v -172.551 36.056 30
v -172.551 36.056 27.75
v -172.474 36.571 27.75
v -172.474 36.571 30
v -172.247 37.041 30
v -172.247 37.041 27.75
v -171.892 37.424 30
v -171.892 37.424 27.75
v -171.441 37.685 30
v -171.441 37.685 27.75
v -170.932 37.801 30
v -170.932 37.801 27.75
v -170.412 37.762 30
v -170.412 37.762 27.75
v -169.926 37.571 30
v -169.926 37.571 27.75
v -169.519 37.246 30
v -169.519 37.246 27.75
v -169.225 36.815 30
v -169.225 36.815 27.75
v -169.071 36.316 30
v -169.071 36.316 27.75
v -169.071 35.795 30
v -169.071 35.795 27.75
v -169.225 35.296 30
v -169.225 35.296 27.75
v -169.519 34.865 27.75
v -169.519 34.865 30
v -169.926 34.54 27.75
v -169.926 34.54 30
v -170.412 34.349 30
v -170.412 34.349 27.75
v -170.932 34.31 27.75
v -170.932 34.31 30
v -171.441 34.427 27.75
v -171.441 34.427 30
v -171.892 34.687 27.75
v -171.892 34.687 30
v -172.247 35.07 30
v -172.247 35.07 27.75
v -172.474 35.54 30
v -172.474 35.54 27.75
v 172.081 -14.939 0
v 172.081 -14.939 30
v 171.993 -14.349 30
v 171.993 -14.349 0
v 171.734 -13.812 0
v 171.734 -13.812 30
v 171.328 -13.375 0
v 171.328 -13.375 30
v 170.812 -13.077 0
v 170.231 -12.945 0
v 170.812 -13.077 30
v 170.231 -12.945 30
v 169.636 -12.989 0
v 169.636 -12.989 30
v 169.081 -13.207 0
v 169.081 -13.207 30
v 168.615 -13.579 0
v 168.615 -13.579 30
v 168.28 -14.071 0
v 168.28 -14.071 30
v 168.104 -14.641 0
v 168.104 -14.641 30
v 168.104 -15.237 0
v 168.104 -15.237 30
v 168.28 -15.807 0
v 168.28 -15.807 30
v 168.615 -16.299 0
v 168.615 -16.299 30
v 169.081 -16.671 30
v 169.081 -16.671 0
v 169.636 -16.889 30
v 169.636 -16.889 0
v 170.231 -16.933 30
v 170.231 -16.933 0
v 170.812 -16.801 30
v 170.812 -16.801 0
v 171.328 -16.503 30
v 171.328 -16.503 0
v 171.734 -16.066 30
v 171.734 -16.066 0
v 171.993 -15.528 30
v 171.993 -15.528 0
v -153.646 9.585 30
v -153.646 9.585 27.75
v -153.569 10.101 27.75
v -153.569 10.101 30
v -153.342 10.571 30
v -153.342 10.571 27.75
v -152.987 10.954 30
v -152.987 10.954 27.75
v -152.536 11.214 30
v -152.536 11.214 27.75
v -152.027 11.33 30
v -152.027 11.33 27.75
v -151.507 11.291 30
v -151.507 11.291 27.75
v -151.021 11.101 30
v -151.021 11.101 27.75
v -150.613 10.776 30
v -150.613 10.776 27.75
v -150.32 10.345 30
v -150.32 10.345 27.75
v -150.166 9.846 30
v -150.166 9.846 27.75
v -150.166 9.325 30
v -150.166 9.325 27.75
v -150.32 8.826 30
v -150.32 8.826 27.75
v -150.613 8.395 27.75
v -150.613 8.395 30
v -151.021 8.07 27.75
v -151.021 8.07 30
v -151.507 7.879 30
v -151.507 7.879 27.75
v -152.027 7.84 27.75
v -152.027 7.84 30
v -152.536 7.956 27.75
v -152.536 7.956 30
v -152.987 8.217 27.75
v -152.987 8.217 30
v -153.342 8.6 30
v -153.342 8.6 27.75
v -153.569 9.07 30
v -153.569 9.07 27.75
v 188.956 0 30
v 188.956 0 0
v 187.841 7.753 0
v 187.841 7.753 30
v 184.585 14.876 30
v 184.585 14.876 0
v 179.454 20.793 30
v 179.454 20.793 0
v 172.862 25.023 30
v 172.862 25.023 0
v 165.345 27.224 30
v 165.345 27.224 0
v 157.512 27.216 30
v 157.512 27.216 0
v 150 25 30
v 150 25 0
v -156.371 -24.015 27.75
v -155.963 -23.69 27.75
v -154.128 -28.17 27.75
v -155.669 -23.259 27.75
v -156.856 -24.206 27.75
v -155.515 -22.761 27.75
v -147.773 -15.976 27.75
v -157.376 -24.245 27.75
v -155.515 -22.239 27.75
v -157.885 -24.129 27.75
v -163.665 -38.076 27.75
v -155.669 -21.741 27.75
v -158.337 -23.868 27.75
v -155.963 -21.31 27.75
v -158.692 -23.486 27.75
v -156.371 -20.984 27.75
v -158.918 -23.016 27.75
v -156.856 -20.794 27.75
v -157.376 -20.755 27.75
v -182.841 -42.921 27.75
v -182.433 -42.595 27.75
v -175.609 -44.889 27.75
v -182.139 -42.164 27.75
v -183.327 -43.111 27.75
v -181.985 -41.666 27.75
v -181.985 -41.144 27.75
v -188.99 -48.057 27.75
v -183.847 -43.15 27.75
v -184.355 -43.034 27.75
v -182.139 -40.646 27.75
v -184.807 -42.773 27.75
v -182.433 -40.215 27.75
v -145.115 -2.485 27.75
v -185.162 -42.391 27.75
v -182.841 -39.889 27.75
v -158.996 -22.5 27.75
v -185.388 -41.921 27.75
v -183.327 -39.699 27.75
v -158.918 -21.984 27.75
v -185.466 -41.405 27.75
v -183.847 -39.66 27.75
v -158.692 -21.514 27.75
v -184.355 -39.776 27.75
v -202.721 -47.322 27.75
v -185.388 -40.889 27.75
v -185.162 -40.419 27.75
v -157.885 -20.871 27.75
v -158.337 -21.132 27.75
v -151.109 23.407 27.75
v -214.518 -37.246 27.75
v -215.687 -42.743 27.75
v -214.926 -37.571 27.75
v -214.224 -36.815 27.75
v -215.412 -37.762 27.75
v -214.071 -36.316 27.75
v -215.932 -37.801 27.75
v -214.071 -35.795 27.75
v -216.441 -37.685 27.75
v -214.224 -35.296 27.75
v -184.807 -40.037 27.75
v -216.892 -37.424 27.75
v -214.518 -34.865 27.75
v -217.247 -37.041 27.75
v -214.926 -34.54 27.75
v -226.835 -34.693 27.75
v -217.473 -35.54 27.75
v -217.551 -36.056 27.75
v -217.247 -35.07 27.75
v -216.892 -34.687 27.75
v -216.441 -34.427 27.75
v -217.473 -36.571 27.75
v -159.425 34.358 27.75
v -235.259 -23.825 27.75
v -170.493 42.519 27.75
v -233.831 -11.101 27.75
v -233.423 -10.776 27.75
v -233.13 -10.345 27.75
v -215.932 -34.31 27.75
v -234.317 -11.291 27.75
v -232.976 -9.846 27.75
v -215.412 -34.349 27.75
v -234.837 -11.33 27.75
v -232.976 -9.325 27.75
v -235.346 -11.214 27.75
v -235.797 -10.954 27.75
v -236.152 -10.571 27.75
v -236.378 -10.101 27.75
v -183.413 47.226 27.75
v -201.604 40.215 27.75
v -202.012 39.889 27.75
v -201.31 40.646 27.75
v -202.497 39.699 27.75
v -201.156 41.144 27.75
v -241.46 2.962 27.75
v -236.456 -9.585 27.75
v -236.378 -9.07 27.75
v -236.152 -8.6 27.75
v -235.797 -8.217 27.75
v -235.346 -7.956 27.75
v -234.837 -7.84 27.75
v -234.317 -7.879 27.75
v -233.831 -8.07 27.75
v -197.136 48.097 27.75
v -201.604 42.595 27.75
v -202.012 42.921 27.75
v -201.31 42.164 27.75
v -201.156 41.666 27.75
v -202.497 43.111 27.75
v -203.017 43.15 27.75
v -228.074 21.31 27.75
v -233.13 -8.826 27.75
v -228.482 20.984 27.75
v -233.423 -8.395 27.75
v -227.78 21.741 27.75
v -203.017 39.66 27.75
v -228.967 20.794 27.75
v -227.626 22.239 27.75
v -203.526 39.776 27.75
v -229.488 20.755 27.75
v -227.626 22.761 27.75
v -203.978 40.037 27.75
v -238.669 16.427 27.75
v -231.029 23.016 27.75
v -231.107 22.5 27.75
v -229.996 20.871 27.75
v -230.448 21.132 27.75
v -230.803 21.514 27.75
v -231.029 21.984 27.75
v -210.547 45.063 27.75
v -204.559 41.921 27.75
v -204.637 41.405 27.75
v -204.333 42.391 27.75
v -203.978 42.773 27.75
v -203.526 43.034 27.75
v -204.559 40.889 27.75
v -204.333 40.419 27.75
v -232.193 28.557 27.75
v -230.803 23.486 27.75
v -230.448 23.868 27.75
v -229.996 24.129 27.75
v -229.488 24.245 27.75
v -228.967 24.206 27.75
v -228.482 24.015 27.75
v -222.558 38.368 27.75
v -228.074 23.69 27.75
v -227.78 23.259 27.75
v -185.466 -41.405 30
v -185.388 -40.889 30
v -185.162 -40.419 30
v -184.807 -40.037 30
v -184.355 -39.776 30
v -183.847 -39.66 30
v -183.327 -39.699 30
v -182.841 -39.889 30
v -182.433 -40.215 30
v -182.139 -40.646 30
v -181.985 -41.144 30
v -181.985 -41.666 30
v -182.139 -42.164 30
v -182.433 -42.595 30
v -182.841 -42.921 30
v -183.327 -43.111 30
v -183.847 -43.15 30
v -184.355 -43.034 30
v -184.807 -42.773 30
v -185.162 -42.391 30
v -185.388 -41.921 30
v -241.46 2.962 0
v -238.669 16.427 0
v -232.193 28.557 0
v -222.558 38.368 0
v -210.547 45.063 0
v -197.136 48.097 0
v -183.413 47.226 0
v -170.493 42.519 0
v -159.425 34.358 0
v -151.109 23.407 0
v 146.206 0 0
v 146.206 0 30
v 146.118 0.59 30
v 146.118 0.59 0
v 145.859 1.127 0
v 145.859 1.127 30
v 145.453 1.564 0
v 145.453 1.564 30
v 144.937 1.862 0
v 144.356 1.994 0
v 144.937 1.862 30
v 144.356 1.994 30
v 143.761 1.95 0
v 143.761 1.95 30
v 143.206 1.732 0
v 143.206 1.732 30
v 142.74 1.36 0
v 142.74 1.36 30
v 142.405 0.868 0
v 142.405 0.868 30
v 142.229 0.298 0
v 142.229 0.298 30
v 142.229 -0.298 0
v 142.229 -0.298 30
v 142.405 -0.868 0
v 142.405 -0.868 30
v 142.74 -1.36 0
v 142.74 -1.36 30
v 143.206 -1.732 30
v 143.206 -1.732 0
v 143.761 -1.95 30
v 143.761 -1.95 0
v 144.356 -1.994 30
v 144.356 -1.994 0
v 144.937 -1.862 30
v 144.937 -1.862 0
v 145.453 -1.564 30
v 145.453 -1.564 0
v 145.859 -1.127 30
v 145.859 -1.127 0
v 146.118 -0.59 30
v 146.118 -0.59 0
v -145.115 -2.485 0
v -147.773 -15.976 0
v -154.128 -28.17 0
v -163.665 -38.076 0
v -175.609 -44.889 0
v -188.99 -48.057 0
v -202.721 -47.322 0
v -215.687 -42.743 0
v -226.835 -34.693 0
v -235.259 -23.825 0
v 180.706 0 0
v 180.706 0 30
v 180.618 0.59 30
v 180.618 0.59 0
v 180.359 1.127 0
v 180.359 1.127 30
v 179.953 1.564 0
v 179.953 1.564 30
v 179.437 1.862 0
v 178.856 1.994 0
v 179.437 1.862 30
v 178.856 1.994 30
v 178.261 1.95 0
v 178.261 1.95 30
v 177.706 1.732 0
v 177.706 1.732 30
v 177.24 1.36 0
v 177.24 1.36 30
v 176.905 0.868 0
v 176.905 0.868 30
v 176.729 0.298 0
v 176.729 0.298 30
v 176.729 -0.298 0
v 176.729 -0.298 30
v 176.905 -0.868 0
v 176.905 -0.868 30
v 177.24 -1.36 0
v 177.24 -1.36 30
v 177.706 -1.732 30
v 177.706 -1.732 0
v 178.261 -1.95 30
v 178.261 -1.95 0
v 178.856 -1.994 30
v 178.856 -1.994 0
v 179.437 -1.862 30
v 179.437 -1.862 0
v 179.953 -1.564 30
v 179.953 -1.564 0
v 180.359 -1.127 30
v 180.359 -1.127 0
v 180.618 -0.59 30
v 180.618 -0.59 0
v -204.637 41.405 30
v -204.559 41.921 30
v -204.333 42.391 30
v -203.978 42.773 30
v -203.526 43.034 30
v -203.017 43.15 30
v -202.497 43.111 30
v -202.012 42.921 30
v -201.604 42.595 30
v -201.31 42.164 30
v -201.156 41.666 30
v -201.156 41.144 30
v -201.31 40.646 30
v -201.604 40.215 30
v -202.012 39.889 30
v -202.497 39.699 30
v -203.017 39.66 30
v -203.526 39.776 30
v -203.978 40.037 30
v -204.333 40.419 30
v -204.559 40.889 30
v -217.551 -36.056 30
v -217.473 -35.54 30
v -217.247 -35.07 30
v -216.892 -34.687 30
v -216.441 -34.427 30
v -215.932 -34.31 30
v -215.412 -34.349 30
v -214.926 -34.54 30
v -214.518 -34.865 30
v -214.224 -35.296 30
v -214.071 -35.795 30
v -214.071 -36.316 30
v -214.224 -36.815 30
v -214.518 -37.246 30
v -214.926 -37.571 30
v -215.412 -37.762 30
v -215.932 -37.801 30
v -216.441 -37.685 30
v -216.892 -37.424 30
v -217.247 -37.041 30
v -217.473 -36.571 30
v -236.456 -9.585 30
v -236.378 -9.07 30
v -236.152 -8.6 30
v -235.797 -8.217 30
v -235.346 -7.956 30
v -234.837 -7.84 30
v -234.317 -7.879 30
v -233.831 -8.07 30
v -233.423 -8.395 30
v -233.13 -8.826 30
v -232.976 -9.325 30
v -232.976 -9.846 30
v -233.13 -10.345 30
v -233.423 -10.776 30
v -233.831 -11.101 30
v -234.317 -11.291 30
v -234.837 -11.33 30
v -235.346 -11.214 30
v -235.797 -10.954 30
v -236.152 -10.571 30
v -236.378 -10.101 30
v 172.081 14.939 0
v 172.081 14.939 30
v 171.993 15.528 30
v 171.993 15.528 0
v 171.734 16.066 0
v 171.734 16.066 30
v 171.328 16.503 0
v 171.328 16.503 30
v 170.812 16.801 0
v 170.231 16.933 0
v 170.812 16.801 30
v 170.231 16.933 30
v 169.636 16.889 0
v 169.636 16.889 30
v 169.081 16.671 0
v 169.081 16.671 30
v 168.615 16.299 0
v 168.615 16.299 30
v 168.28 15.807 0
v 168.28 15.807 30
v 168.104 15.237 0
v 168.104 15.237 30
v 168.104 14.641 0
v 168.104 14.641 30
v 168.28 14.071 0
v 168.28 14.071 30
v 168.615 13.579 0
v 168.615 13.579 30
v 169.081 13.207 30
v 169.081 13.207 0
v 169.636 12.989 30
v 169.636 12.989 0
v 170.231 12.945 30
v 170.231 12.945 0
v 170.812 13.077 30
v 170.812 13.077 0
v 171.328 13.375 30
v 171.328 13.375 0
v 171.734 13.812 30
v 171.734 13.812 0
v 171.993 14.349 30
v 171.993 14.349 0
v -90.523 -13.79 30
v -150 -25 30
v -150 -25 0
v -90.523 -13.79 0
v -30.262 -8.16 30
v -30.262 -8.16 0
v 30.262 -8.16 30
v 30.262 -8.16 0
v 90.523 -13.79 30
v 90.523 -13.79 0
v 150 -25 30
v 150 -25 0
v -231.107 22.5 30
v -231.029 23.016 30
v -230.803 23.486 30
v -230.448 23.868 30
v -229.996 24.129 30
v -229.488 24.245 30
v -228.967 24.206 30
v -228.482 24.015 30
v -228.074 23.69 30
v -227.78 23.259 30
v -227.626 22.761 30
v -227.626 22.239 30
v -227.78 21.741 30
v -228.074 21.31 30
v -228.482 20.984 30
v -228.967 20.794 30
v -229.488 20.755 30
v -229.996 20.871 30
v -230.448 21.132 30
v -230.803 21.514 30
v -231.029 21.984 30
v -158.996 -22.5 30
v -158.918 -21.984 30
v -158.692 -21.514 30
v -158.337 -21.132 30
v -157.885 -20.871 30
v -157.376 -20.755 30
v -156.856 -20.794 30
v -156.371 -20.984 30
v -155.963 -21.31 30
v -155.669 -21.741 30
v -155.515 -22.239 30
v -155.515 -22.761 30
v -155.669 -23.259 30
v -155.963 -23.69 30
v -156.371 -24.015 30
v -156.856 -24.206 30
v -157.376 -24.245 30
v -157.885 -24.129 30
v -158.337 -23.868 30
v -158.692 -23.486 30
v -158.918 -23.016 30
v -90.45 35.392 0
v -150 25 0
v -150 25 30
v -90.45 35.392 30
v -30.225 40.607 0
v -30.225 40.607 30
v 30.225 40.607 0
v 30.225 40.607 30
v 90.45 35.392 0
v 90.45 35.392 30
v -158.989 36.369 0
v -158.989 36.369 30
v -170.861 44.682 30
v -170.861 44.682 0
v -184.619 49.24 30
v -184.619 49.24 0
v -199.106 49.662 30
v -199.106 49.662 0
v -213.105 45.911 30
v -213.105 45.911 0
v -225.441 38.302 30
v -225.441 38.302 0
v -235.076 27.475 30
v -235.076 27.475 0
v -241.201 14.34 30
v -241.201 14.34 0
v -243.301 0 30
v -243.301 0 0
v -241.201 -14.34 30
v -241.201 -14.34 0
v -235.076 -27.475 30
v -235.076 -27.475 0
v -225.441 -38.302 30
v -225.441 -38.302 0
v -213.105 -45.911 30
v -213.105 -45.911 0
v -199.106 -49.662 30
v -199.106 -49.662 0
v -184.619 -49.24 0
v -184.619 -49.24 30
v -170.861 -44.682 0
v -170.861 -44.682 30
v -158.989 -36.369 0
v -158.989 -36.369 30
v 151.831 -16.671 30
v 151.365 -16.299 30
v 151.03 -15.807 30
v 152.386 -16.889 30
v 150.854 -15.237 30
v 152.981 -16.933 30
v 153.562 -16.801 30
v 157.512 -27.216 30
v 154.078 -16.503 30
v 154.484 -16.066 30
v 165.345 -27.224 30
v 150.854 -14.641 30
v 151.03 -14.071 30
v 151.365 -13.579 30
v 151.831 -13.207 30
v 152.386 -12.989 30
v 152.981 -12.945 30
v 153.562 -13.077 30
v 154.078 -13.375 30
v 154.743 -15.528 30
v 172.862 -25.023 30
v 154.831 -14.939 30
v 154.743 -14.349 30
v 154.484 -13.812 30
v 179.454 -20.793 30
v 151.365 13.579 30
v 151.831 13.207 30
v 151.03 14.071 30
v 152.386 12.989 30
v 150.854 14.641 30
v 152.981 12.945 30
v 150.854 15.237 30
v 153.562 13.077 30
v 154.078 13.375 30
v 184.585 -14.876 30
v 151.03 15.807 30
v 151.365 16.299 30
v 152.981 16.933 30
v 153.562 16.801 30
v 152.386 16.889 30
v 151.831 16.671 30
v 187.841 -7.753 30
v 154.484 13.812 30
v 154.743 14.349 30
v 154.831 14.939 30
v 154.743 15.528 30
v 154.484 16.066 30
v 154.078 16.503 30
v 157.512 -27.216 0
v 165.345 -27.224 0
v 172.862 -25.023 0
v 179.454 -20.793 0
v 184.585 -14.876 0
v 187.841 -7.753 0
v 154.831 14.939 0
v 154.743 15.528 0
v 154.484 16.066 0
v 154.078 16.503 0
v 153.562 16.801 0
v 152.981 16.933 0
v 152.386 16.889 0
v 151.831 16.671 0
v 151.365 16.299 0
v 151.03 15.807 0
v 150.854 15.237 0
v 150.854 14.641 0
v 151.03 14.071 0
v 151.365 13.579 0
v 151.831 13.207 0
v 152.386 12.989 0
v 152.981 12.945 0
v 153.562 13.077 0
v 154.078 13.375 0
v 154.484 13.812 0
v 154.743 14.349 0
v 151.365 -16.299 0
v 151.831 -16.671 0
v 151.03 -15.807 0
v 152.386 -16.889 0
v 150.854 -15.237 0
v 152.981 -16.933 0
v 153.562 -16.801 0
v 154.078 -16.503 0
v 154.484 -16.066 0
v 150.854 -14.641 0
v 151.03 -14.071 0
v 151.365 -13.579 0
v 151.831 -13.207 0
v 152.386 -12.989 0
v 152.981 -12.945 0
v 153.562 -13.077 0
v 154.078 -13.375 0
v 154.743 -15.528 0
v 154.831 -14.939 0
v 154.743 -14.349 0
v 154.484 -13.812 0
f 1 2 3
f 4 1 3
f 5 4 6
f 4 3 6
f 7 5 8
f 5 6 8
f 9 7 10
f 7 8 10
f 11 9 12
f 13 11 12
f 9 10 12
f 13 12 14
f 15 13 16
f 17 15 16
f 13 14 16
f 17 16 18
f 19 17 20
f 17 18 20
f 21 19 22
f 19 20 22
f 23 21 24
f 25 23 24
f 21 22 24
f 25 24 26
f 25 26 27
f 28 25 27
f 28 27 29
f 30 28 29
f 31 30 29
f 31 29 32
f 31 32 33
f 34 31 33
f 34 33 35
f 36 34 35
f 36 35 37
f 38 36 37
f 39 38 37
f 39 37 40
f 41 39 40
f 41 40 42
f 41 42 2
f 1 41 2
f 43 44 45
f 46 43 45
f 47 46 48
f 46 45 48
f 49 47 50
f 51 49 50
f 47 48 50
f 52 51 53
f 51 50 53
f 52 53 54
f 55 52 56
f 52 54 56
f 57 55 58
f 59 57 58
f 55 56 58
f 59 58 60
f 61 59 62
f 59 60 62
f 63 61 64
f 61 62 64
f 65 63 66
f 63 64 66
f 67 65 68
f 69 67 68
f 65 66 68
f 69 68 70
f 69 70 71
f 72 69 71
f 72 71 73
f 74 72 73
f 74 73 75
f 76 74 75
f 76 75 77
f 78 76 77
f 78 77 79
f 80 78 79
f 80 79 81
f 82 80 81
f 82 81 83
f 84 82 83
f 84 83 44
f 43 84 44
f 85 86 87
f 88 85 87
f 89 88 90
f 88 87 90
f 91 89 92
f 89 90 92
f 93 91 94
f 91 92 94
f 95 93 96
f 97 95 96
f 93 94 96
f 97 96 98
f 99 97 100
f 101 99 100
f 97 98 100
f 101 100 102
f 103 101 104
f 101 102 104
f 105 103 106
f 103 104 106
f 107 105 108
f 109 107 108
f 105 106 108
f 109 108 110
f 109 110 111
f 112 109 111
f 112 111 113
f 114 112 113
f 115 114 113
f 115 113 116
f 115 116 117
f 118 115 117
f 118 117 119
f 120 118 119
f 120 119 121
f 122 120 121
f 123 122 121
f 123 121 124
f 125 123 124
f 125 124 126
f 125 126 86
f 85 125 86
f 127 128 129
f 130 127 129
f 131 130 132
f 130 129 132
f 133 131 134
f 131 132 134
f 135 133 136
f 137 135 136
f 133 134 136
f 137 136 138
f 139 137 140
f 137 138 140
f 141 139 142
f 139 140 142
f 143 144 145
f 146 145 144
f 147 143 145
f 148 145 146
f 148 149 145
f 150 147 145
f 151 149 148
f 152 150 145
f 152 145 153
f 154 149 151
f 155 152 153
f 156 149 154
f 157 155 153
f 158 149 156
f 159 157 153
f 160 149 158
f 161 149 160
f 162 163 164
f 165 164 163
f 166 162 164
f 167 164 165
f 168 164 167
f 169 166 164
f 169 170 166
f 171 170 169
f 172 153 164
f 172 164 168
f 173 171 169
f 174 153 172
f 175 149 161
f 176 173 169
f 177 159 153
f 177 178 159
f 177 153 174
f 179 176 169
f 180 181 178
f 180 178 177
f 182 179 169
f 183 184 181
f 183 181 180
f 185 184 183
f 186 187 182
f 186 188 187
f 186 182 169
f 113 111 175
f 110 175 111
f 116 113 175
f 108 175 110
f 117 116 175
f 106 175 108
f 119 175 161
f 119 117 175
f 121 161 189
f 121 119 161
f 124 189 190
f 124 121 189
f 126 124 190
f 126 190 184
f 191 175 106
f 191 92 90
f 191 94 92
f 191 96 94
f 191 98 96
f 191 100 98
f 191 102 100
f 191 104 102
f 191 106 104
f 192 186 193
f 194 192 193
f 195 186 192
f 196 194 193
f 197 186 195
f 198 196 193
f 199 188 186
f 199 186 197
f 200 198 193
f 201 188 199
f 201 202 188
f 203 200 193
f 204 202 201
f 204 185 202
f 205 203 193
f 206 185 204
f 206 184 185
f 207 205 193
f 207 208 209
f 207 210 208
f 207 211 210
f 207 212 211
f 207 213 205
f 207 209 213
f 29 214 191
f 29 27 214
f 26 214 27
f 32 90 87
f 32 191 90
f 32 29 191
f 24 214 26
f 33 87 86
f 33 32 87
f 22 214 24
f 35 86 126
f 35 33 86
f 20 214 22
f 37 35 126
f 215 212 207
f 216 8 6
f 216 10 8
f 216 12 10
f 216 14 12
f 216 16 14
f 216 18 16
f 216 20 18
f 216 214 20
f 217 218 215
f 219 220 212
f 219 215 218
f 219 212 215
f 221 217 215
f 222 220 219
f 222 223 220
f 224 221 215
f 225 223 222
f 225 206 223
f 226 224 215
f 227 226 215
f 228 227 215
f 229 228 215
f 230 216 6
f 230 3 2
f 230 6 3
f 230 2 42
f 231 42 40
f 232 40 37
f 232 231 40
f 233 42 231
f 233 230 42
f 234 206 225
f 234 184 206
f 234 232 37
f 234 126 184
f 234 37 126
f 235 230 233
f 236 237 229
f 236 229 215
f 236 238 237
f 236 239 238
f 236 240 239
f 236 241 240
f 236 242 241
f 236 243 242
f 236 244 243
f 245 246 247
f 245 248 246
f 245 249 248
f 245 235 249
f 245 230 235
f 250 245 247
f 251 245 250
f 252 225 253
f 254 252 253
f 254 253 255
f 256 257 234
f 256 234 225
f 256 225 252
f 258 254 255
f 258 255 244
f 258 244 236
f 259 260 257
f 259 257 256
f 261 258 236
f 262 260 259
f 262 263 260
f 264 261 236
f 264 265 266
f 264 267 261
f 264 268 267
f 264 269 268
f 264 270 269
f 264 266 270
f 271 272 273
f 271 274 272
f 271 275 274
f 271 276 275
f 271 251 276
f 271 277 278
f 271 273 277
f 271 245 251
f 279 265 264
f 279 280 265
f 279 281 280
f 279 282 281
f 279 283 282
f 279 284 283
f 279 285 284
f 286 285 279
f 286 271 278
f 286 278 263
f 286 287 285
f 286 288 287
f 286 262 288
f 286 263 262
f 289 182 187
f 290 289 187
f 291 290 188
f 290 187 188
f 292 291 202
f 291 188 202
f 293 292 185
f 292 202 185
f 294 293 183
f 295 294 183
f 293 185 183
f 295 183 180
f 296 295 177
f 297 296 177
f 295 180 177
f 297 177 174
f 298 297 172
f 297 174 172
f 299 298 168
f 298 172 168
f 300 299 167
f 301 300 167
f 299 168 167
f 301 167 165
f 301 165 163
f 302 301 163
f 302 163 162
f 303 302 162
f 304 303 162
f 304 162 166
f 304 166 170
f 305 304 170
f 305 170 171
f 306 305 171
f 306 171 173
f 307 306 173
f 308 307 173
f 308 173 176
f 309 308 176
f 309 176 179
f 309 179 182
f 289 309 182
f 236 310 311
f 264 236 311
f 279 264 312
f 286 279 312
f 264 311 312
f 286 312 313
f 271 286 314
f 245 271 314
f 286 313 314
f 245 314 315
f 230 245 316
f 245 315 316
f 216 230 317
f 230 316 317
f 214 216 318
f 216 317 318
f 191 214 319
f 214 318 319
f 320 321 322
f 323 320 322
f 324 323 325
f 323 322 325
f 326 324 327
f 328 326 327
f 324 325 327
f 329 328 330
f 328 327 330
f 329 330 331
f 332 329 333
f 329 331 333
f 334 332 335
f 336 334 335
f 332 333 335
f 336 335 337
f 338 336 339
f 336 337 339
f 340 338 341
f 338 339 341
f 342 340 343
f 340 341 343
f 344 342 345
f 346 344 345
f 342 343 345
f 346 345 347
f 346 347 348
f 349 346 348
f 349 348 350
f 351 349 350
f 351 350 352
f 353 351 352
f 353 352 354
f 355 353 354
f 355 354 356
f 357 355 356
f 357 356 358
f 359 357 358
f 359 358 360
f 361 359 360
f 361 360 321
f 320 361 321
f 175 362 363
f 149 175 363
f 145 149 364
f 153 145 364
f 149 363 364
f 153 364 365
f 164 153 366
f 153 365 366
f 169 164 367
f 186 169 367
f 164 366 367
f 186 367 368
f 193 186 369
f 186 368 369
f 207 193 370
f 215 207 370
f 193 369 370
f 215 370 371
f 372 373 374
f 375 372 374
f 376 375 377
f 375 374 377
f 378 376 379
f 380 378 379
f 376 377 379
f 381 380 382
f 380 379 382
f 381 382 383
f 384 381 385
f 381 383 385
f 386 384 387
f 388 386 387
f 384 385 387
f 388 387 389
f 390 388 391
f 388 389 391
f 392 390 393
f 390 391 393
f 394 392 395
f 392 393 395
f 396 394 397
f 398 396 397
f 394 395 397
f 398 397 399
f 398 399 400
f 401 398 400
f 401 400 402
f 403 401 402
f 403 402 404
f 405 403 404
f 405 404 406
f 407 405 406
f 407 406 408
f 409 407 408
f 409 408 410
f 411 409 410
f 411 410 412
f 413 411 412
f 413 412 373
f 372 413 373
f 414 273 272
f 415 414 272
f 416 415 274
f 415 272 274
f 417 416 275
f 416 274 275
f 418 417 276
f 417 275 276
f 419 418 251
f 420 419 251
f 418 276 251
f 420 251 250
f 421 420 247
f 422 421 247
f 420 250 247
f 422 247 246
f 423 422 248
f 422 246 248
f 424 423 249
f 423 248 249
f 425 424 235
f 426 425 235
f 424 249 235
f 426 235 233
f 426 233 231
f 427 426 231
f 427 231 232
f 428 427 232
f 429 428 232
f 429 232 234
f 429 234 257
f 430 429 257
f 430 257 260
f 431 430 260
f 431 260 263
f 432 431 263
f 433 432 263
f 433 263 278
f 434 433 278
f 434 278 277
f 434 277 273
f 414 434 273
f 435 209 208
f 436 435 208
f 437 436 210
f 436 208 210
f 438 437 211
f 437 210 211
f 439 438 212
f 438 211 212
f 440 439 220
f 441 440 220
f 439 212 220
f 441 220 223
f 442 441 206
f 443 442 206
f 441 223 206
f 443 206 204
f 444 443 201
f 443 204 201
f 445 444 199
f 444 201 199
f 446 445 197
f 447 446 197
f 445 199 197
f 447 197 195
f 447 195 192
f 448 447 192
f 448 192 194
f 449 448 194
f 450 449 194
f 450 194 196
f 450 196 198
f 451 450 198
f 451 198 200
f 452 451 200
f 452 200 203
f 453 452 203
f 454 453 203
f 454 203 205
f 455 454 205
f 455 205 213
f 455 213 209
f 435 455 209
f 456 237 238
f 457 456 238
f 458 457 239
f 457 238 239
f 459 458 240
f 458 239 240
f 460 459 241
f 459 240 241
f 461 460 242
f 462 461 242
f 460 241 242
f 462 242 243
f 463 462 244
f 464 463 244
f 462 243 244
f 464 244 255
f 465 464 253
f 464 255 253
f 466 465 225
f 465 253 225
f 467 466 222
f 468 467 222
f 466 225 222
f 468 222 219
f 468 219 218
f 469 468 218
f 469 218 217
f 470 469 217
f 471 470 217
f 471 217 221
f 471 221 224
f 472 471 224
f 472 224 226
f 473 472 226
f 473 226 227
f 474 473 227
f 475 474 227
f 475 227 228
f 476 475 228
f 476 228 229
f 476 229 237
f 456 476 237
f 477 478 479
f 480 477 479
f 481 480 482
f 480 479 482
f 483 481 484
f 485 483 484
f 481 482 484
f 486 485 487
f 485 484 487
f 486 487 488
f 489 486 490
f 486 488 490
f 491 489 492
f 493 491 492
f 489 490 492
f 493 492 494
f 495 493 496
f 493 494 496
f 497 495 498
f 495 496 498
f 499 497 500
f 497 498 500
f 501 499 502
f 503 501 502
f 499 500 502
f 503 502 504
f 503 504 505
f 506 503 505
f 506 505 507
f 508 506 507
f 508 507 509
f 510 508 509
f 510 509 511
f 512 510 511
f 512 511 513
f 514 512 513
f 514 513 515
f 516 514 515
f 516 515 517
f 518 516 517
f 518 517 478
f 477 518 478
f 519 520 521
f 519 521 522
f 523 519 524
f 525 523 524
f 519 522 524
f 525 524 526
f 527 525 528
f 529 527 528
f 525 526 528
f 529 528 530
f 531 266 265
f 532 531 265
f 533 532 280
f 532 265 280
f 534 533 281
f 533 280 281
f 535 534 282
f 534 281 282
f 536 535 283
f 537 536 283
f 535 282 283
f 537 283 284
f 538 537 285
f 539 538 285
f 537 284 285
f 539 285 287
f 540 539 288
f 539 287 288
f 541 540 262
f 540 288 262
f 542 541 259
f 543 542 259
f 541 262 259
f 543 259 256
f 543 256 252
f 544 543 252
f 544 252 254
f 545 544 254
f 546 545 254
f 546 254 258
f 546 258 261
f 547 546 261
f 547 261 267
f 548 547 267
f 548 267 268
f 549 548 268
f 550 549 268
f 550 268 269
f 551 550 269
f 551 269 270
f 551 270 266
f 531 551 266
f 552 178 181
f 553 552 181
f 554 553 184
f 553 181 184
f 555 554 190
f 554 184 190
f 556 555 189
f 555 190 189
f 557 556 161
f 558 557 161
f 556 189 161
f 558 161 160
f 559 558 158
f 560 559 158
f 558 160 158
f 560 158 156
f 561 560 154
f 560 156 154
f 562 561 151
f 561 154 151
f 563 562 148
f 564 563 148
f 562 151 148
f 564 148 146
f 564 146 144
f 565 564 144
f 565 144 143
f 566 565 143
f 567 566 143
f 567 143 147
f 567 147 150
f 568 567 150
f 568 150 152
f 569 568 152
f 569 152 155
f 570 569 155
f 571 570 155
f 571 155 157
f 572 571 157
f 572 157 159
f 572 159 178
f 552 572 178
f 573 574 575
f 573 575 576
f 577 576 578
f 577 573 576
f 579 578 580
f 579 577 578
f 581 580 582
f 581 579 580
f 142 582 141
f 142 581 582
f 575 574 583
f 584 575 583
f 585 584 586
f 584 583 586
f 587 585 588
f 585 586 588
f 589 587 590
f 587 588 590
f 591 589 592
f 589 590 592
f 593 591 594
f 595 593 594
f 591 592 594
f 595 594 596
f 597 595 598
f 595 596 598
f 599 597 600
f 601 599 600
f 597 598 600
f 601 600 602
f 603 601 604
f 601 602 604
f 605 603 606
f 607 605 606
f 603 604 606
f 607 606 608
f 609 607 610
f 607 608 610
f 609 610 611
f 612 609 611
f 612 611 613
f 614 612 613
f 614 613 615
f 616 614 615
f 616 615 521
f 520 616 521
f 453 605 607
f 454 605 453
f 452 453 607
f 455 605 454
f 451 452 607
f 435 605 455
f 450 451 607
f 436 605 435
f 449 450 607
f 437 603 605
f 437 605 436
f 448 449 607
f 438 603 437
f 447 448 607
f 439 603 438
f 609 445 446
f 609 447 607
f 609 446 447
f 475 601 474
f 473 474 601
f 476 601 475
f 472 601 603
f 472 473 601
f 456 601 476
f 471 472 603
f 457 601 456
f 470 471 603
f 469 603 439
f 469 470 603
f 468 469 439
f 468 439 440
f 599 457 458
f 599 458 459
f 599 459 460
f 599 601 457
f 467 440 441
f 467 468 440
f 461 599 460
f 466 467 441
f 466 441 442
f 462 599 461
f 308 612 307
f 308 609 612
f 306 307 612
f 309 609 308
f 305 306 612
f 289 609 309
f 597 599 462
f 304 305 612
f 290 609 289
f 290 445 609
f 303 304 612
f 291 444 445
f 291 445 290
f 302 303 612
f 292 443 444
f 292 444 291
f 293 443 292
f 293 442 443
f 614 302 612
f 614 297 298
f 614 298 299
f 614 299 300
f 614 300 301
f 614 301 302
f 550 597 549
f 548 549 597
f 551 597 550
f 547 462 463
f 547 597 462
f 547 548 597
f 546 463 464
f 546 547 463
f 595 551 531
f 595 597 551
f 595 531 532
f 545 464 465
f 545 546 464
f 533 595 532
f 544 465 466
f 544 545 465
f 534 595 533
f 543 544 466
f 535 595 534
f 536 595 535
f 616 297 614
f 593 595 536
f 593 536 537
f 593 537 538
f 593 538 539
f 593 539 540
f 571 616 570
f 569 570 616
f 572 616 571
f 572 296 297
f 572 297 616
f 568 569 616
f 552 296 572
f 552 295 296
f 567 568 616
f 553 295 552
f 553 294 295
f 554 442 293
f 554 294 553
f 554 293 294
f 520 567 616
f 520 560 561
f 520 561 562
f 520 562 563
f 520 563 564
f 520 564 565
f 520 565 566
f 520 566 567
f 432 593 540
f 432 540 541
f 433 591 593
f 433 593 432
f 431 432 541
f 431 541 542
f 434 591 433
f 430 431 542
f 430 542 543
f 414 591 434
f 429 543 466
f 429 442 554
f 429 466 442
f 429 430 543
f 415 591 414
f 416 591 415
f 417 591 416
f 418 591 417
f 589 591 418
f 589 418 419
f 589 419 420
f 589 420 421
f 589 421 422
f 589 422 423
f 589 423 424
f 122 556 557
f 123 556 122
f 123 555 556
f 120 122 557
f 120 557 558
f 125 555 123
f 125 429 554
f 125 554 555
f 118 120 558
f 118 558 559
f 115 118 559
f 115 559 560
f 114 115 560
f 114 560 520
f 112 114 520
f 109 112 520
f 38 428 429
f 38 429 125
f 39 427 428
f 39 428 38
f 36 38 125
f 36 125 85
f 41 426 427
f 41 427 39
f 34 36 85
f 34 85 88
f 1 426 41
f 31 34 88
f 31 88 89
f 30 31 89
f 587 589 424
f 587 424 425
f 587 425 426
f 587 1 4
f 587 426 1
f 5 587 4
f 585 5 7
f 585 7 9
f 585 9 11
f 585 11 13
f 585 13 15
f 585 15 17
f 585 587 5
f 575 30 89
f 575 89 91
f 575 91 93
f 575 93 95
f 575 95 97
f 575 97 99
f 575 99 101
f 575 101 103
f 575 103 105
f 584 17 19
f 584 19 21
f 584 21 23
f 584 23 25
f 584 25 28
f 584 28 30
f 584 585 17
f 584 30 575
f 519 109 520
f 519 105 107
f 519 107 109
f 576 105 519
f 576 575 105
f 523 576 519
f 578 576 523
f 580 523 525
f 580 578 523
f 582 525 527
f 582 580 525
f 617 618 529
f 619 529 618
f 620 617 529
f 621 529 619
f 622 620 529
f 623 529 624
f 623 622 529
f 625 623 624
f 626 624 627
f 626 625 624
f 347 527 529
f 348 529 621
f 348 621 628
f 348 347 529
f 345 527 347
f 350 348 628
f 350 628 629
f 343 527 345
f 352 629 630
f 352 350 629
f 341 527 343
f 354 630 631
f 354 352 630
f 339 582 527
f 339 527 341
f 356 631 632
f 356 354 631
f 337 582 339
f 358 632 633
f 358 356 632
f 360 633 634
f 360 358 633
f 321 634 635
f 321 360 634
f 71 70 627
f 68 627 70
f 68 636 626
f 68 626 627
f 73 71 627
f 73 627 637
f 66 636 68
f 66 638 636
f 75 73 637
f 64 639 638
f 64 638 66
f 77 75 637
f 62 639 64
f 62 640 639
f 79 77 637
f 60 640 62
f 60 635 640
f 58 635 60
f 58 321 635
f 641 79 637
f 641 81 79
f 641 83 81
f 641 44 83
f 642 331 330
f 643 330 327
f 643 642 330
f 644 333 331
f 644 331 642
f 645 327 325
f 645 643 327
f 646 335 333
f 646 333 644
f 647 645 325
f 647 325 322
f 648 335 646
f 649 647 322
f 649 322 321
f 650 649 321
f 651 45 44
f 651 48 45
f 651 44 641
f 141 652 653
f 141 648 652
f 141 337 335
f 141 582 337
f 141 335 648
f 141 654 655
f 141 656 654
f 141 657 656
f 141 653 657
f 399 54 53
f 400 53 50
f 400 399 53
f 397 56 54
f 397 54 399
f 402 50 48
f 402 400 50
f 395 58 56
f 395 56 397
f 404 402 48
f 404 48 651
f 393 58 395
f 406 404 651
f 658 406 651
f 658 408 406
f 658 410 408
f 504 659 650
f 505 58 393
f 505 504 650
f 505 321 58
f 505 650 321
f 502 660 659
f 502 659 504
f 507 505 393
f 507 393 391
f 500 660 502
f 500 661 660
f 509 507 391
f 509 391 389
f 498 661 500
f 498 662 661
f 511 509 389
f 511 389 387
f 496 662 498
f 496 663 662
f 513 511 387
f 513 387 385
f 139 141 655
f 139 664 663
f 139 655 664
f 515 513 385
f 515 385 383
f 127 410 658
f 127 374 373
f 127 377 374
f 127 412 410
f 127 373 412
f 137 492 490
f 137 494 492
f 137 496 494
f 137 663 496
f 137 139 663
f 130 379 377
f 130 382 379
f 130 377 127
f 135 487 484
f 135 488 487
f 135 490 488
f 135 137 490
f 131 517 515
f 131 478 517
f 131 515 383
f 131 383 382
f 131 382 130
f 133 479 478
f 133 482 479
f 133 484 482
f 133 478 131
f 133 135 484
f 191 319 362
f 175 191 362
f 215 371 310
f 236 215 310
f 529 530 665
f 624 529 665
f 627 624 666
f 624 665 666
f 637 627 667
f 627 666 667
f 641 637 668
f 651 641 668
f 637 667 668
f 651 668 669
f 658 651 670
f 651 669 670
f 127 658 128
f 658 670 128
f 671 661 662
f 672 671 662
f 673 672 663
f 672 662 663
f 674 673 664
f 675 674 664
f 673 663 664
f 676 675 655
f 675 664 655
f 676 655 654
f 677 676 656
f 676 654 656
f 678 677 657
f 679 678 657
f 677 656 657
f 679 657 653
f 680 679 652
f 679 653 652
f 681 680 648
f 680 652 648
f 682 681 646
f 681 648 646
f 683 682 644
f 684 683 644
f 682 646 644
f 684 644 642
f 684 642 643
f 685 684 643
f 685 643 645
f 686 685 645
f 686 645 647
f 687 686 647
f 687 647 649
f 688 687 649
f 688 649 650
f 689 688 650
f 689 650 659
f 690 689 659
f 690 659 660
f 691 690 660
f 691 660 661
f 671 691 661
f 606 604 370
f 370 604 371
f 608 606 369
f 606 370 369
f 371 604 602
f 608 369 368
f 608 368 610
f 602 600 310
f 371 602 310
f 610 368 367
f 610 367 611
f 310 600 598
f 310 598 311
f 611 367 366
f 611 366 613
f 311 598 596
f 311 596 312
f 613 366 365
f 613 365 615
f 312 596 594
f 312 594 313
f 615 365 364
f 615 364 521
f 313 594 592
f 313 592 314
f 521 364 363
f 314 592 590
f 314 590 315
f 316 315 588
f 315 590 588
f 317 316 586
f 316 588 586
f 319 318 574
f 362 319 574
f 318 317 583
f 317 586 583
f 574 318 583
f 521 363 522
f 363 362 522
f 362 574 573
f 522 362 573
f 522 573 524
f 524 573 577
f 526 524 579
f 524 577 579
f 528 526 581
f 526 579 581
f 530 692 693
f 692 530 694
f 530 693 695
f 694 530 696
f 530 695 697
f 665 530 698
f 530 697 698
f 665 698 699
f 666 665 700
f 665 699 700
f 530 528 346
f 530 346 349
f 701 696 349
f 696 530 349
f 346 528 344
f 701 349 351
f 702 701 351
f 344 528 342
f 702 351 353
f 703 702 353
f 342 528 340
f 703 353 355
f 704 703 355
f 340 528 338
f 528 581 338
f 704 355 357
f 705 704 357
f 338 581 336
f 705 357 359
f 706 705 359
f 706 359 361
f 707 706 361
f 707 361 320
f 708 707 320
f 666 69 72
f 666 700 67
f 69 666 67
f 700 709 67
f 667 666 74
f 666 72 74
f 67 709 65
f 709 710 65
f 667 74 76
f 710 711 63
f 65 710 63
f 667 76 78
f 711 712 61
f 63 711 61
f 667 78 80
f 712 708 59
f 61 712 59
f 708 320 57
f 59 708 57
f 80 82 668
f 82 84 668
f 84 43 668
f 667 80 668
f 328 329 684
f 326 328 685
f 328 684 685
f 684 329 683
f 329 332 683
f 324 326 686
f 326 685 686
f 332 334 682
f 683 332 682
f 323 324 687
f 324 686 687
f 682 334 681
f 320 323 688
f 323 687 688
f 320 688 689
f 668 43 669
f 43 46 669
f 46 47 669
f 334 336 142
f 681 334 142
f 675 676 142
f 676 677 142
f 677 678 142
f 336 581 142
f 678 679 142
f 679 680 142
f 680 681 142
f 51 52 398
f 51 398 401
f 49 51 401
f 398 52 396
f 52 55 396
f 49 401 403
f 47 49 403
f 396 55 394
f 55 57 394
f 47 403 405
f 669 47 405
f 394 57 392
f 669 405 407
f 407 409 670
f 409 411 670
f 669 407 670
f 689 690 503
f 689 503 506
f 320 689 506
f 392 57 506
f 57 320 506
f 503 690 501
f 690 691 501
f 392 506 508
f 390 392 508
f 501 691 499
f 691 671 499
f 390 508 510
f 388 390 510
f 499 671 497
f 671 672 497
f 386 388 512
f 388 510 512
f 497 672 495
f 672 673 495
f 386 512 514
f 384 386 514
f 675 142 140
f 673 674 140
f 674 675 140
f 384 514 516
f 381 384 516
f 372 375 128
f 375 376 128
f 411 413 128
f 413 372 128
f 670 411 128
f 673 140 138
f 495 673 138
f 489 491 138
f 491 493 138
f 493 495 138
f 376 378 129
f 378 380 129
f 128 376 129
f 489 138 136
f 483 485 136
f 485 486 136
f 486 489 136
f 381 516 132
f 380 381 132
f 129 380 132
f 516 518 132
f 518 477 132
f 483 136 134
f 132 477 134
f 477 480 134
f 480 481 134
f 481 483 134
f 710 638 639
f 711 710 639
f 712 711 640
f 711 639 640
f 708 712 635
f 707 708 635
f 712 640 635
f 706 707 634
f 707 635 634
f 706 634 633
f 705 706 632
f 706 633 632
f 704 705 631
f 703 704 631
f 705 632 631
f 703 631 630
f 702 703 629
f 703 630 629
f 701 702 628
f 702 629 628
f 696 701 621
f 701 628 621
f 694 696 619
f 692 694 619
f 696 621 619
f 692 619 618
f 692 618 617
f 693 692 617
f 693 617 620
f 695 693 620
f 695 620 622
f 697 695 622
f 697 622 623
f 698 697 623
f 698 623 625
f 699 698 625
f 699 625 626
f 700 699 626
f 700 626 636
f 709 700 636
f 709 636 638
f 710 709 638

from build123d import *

# Parameters (mm, degrees)
EXTRUDE_3_DEPTH     = 30
CUT_EXTRUDE_1_DEPTH = 27.75
SKETCH_5_R          = 1.75
CUT_EXTRUDE_2_DEPTH = 250.931131666
SKETCH_6_R          = 2
CUT_EXTRUDE_3_DEPTH = 251.190943233


with BuildPart() as part:
    # 草图1 → 凸台-拉伸3 (new body)
    with BuildSketch(Plane.XY):
        with BuildLine():
            ThreePointArc((188.956439237, 0), (176.309013441, 23.14413618), (150, 25))
            Line((150, 25), (150, -25))
            ThreePointArc((150, -25), (176.309013441, -23.14413618), (188.956439237, 0))
        make_face()
        with BuildLine():
            Line((150, -25), (150, 25))
            ThreePointArc((150, 25), (133.956439237, 0), (150, -25))
        make_face()
        with BuildLine():
            ThreePointArc((188.956439237, 0), (176.309013441, 23.14413618), (150, 25))
            Line((150, 25), (150, -25))
            ThreePointArc((150, -25), (176.309013441, -23.14413618), (188.956439237, 0))
        make_face()
        with BuildLine():
            Line((150, -25), (150, 25))
            ThreePointArc((150, 25), (133.956439237, 0), (150, -25))
        make_face()
        with BuildLine():
            Line((150, 25), (-150, 25))
            ThreePointArc((-150, 25), (-145.004978875, 12.940952255), (-143.301270189, 0))
            ThreePointArc((-143.301270189, 0), (-145.004978875, -12.940952255), (-150, -25))
            ThreePointArc((-150, -25), (0, -7.455532034), (150, -25))
            ThreePointArc((150, -25), (133.956439237, 0), (150, 25))
        make_face()
        with BuildLine():
            ThreePointArc((-150, 25), (0, 41.260283441), (150, 25))
            Line((150, 25), (-150, 25))
        make_face()
        with BuildLine():
            ThreePointArc((-143.301270189, 0), (-145.004978875, 12.940952255), (-150, 25))
            Line((-150, 25), (-150, -25))
            ThreePointArc((-150, -25), (-145.004978875, -12.940952255), (-143.301270189, 0))
        make_face()
        with BuildLine():
            Line((-150, -25), (-150, 25))
            ThreePointArc((-150, 25), (-243.301270189, 0), (-150, -25))
        make_face()
        with BuildLine():
            ThreePointArc((-143.301270189, 0), (-145.004978875, 12.940952255), (-150, 25))
            Line((-150, 25), (-150, -25))
            ThreePointArc((-150, -25), (-145.004978875, -12.940952255), (-143.301270189, 0))
        make_face()
        with BuildLine():
            Line((-150, -25), (-150, 25))
            ThreePointArc((-150, 25), (-243.301270189, 0), (-150, -25))
        make_face()
    extrude(amount=EXTRUDE_3_DEPTH)

    # 草图3 → 切除-拉伸1 (cut)
    with BuildSketch(Plane(origin=(0, 0, 0), x_dir=(-1, 0, 0), z_dir=(0, 0, -1))):
        with BuildLine():
            ThreePointArc((241.460241998, 2.962420354), (203.950254971, 47.06019149), (151.10937756, 23.40740687))
            Line((151.10937756, 23.40740687), (145.115292459, -2.484763599))
            ThreePointArc((145.115292459, -2.484763599), (182.186192507, -46.952290127), (235.258997062, -23.8246019))
            Line((235.258997062, -23.8246019), (238.35961953, -10.431090773))
            Line((238.35961953, -10.431090773), (241.460241998, 2.962420354))
        make_face()
    extrude(amount=-CUT_EXTRUDE_1_DEPTH, mode=Mode.SUBTRACT)

    # 草图5 → 切除-拉伸2 (cut, through all)
    with BuildSketch(Plane(origin=(0, 0, 27.75), x_dir=(-1, 0, 0), z_dir=(0, 0, -1))):
        with Locations((151.896300525, 9.585326657)):
            Circle(SKETCH_5_R)
        with Locations((170.801384844, 36.055584303)):
            Circle(SKETCH_5_R)
        with Locations((202.886596846, 41.404969664)):
            Circle(SKETCH_5_R)
        with Locations((229.356854492, 22.499885346)):
            Circle(SKETCH_5_R)
        with Locations((234.706239853, -9.585326656)):
            Circle(SKETCH_5_R)
        with Locations((215.801155535, -36.055584303)):
            Circle(SKETCH_5_R)
        with Locations((183.715943533, -41.404969664)):
            Circle(SKETCH_5_R)
        with Locations((157.245685886, -22.499885346)):
            Circle(SKETCH_5_R)
    extrude(amount=-CUT_EXTRUDE_2_DEPTH, mode=Mode.SUBTRACT)

    # 草图6 → 切除-拉伸3 (cut, through all)
    with BuildSketch(Plane.XY.offset(30)):
        with Locations((178.706439237, 0)):
            Circle(SKETCH_6_R)
        with Locations((170.081439237, -14.938938215)):
            Circle(SKETCH_6_R)
        with Locations((152.831439237, -14.938938215)):
            Circle(SKETCH_6_R)
        with Locations((144.206439237, 0)):
            Circle(SKETCH_6_R)
        with Locations((152.831439237, 14.938938215)):
            Circle(SKETCH_6_R)
        with Locations((170.081439237, 14.938938215)):
            Circle(SKETCH_6_R)
    extrude(amount=-CUT_EXTRUDE_3_DEPTH, mode=Mode.SUBTRACT)


solid = part.part
